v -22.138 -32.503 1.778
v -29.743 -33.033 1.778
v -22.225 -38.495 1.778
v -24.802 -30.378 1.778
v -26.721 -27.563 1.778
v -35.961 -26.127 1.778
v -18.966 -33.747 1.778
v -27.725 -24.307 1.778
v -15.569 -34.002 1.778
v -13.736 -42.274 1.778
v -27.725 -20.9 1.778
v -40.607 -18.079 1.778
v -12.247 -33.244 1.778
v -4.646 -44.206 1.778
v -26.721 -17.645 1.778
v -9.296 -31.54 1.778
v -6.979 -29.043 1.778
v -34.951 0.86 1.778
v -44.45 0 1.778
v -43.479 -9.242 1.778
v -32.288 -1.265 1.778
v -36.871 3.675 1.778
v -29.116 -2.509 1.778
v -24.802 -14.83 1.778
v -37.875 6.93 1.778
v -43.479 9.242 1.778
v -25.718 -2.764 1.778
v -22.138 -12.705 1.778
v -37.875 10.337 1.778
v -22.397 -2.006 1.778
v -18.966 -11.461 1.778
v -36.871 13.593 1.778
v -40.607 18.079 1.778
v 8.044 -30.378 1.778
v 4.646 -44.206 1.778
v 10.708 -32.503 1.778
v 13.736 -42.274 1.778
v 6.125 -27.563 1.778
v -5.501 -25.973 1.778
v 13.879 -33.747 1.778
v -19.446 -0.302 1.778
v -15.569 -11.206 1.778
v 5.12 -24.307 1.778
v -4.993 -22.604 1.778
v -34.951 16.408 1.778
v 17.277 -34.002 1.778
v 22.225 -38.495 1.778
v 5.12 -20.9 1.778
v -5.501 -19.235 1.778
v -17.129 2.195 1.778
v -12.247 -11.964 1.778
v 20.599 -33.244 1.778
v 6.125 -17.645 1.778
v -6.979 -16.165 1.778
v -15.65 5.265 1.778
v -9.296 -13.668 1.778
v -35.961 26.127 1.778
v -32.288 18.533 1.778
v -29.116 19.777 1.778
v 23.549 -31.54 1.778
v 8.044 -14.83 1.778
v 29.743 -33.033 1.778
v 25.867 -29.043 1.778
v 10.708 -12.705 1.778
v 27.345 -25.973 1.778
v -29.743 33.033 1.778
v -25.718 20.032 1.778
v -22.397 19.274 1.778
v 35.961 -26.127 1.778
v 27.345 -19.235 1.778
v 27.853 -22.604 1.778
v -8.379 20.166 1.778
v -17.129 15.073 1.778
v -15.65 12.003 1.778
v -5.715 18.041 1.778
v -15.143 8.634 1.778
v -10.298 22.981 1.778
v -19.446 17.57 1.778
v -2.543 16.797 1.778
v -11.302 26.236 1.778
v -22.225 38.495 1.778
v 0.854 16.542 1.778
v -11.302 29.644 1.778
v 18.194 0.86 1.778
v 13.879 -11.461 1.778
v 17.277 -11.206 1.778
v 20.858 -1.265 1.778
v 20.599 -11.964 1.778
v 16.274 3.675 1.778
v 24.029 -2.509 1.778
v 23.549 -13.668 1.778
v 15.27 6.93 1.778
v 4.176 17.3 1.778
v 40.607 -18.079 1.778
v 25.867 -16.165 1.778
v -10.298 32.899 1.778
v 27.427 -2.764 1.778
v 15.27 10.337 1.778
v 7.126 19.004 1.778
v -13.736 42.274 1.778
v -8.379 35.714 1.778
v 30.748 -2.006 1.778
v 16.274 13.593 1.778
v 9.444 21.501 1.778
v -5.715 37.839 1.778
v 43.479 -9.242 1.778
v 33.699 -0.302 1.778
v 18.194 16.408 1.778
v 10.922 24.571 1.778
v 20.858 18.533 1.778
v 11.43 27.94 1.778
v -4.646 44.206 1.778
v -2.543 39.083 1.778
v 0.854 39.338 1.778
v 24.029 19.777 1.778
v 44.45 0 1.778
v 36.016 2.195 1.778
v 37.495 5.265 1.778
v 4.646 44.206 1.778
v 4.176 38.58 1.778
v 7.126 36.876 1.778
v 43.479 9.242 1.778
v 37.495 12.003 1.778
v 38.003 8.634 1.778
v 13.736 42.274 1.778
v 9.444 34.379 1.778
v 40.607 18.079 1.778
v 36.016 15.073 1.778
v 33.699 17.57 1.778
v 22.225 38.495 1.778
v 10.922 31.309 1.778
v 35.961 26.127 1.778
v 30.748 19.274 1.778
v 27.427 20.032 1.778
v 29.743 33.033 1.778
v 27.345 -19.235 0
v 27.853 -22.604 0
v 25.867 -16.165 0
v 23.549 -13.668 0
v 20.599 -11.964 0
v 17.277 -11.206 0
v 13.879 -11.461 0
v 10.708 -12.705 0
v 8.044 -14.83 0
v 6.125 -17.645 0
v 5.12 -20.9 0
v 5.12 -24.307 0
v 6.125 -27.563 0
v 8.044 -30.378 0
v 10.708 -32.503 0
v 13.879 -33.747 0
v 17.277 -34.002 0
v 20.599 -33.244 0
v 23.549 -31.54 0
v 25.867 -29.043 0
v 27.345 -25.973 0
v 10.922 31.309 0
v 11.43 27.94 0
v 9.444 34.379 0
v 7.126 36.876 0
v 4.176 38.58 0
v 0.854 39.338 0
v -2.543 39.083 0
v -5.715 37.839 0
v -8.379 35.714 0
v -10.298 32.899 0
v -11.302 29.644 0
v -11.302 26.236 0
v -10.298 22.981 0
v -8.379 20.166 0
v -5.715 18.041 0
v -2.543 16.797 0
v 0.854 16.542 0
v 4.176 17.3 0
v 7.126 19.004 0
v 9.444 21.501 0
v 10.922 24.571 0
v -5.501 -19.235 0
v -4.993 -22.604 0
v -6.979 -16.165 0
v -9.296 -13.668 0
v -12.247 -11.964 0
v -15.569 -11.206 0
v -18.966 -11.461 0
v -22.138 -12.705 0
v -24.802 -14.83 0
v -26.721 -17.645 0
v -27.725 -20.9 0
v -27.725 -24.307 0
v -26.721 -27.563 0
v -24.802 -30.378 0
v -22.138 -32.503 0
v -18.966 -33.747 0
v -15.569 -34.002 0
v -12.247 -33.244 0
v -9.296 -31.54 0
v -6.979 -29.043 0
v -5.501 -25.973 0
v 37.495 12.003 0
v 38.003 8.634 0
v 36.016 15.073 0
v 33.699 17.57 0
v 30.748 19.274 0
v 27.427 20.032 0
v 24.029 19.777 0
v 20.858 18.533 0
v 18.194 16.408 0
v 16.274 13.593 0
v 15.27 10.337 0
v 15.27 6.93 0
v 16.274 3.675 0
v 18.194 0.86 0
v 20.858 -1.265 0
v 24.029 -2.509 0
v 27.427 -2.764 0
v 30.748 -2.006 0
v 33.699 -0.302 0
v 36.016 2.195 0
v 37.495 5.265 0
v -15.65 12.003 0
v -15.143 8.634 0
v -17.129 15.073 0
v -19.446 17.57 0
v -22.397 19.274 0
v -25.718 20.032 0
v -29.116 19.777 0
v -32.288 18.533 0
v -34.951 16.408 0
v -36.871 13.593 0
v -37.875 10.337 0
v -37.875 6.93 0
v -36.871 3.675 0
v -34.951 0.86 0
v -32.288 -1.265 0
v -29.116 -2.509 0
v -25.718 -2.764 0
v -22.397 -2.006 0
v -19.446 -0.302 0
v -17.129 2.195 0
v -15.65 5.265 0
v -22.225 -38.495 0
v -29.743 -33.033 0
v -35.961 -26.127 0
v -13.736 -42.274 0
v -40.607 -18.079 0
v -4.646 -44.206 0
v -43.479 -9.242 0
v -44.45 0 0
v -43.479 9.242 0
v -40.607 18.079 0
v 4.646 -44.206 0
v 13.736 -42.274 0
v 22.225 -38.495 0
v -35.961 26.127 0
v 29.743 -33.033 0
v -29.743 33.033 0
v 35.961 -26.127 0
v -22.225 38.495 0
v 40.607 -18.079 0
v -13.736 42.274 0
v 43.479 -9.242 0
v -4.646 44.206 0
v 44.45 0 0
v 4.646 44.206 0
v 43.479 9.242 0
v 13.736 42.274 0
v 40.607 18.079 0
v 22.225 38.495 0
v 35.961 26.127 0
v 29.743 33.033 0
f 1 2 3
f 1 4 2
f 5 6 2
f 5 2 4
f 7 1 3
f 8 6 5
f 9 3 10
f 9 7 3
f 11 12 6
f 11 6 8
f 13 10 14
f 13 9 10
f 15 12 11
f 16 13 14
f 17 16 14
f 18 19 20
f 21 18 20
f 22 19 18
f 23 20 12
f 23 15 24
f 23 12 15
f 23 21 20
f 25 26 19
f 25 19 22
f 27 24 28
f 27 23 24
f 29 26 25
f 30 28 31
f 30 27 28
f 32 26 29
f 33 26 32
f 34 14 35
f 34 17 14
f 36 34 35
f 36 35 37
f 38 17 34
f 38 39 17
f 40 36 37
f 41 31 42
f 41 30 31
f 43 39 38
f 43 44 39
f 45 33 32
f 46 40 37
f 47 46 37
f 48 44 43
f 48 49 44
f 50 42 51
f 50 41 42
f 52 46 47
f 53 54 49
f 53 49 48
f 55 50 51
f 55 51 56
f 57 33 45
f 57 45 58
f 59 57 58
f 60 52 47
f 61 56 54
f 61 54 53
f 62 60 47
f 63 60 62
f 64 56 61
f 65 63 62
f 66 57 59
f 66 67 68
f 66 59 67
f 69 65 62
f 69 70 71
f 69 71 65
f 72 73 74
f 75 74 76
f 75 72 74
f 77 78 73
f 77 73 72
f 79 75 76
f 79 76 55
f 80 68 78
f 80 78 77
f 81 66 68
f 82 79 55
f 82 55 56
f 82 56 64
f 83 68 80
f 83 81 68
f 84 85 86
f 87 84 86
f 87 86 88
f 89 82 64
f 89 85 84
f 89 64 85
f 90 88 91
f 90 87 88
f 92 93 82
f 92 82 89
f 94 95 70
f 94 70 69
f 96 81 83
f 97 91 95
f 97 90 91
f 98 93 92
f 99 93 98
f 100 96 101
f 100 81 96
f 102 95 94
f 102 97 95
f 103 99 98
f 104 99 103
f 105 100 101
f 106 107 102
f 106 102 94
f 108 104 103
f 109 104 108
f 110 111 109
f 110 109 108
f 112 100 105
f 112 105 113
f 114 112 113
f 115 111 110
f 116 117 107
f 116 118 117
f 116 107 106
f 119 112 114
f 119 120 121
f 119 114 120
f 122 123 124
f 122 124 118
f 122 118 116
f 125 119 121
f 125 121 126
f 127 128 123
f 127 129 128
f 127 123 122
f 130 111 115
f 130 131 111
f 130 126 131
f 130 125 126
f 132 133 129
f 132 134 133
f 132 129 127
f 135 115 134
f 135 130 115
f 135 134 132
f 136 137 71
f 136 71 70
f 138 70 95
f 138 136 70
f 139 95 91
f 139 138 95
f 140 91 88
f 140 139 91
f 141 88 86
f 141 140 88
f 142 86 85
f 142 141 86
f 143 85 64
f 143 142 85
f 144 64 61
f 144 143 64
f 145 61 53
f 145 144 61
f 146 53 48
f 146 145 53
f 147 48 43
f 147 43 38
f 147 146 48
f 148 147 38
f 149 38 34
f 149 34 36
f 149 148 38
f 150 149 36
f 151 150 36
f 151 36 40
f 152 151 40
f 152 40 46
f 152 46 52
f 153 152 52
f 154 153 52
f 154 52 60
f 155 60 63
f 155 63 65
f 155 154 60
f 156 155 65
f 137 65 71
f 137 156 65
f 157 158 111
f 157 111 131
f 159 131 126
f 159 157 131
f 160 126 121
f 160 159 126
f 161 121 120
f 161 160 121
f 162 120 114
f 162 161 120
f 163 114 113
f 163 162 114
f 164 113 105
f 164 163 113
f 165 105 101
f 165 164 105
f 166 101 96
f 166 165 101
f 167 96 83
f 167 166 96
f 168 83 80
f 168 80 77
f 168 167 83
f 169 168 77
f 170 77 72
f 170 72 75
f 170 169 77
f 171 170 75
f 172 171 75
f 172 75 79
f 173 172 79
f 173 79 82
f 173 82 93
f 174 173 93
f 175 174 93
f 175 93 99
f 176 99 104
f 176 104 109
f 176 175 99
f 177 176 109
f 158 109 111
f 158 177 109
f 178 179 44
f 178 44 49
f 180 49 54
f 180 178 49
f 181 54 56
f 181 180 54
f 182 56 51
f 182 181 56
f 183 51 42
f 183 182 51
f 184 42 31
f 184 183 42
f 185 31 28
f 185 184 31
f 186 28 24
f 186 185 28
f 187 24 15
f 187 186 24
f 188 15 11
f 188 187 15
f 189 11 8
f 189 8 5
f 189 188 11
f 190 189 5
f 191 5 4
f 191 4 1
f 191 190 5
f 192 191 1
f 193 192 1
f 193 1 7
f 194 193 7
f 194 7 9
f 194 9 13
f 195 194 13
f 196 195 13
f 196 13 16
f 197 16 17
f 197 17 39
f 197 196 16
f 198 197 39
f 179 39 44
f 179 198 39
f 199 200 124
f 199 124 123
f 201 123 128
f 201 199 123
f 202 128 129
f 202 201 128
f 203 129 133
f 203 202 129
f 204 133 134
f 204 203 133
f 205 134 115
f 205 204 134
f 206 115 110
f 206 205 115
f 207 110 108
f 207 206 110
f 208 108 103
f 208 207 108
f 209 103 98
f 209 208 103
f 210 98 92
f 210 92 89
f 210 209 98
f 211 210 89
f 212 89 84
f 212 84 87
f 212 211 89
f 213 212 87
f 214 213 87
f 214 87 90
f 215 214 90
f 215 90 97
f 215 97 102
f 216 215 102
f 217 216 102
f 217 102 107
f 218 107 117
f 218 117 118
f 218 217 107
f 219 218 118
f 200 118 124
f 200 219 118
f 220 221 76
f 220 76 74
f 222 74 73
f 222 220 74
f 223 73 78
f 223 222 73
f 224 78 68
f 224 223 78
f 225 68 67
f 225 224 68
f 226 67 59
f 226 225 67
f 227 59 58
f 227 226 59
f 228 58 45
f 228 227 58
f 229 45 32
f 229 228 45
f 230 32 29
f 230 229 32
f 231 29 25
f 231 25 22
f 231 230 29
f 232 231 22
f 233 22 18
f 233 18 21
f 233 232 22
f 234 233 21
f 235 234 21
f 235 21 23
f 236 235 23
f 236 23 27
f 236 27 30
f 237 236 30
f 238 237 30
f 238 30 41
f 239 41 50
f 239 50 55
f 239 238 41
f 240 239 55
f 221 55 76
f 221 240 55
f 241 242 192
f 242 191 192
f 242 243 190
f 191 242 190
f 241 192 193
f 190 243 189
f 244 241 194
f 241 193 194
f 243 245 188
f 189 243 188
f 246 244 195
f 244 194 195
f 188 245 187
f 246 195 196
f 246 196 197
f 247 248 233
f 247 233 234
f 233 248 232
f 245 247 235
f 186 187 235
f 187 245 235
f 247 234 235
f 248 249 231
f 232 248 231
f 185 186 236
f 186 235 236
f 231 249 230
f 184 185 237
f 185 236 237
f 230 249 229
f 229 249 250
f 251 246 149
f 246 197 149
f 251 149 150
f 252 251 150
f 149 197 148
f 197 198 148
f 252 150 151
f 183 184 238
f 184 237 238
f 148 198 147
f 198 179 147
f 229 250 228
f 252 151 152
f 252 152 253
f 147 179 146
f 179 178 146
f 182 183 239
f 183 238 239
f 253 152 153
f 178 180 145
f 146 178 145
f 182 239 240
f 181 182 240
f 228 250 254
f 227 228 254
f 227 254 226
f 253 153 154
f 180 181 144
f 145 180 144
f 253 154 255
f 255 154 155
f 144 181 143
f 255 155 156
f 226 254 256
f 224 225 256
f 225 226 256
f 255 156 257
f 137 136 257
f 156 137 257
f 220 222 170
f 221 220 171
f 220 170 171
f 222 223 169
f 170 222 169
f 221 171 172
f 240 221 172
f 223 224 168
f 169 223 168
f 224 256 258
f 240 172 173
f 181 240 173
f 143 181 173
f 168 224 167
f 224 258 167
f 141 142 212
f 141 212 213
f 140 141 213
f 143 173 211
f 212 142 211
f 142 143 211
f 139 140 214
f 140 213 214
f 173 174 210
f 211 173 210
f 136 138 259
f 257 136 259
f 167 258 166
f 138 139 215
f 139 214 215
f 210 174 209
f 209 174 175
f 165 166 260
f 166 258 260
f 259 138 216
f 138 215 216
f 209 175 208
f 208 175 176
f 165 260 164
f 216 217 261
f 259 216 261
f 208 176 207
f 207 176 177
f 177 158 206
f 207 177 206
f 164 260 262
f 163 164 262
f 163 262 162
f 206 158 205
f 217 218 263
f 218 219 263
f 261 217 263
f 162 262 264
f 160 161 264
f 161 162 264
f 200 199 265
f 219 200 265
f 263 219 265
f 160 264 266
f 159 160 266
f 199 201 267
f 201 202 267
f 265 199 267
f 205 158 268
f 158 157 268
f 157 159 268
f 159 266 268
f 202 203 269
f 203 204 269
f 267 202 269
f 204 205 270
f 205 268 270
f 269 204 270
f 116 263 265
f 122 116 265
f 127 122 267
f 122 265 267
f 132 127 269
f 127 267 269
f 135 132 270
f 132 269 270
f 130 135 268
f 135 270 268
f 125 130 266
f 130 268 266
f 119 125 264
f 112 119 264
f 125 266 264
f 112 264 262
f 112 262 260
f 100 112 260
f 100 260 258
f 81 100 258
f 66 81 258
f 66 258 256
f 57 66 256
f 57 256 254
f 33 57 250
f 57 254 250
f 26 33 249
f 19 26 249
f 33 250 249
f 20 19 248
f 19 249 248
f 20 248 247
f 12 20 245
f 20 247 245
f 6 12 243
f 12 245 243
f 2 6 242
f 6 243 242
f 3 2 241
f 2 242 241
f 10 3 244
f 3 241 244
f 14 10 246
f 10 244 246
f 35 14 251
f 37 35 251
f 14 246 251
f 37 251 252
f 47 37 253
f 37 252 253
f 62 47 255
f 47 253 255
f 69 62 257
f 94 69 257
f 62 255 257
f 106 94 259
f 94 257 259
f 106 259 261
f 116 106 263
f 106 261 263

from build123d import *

# Parameters (mm, degrees)
F0_R     = 44.45
F0_R_2   = 11.43
F1_DEPTH = 1.778


with BuildPart() as f1:
    # F0 (on Top) → F1 (new body)
    with BuildSketch(Plane.XY):
        Circle(F0_R)
        with Locations((-16.42272, -22.603935)):
            Circle(F0_R_2, mode=Mode.SUBTRACT)
        with Locations((16.42272, -22.603935)):
            Circle(F0_R_2, mode=Mode.SUBTRACT)
        with Locations((-26.572519, 8.633935)):
            Circle(F0_R_2, mode=Mode.SUBTRACT)
        with Locations((26.572519, 8.633935)):
            Circle(F0_R_2, mode=Mode.SUBTRACT)
        with Locations((0, 27.94)):
            Circle(F0_R_2, mode=Mode.SUBTRACT)
    extrude(amount=F1_DEPTH)


solid = f1.part
